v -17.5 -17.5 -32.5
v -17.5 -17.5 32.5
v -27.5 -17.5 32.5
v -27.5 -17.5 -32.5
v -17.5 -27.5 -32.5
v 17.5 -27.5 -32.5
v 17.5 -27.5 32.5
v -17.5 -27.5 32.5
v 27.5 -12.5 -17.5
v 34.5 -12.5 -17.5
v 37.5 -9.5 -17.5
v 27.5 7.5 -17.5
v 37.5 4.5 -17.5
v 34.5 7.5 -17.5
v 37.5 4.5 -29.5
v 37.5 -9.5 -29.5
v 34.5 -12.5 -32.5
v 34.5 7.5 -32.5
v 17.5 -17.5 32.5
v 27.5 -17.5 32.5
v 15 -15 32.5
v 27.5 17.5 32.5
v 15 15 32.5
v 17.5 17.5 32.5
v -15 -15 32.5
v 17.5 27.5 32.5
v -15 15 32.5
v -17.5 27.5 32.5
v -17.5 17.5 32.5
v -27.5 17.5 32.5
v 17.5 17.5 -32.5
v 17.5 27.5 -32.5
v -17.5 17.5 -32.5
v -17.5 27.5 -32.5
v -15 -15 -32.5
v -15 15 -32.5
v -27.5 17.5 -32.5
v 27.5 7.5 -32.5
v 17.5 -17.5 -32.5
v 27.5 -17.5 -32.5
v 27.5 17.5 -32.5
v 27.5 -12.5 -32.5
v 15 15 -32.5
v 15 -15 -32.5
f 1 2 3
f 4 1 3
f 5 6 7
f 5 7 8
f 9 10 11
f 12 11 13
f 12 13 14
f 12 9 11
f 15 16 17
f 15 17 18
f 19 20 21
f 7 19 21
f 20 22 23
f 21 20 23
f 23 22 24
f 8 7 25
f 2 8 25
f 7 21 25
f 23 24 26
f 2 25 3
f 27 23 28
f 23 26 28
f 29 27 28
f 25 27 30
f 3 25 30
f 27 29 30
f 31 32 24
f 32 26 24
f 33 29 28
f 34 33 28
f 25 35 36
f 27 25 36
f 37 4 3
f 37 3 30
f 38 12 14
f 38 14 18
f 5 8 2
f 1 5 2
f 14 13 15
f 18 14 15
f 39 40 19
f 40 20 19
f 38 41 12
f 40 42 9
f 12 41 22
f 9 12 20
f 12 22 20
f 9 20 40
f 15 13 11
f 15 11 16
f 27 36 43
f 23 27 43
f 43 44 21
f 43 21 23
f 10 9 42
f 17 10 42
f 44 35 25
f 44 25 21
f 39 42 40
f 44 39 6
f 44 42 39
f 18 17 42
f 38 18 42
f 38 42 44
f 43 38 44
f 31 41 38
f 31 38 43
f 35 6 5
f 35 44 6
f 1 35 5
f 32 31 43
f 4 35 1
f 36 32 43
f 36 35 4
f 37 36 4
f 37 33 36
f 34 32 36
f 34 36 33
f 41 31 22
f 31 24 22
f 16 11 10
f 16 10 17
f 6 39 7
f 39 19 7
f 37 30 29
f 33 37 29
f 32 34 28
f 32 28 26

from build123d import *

# Parameters (mm, degrees)
SKETCH1_W           = 30
SKETCH1_H           = 30
BOSS_EXTRUDE1_DEPTH = 32.5
SKETCH2_W           = 15
SKETCH2_H           = 20
BOSS_EXTRUDE2_DEPTH = 10
CHAMFER1_SIZE       = 3


with BuildPart() as part:
    # Sketch1 → Boss-Extrude1 (new body, symmetric)
    with BuildSketch(Plane.XY):
        Polygon((-17.5, 27.5), (17.5, 27.5), (17.5, 17.5), (27.5, 17.5), (27.5, -17.5), (17.5, -17.5), (17.5, -27.5), (-17.5, -27.5), (-17.5, -17.5), (-27.5, -17.5), (-27.5, 17.5), (-17.5, 17.5), align=None)
        Rectangle(SKETCH1_W, SKETCH1_H, mode=Mode.SUBTRACT)
    extrude(amount=BOSS_EXTRUDE1_DEPTH, both=True)

    # Sketch2 → Boss-Extrude2 (add)
    with BuildSketch(Plane(origin=(27.5, 0, 0), x_dir=(0, 0, -1), z_dir=(1, 0, 0))):
        with Locations((25, -2.5)):
            Rectangle(SKETCH2_W, SKETCH2_H)
    extrude(amount=BOSS_EXTRUDE2_DEPTH)

    # Chamfer1
    chamfer1_edges = [part.edges().sort_by_distance(p)[0] for p in [
        (37.5, -2.5, -32.5),
        (37.5, 7.5, -25),
        (37.5, -12.5, -25),
    ]]
    chamfer(chamfer1_edges, length=CHAMFER1_SIZE)


solid = part.part
